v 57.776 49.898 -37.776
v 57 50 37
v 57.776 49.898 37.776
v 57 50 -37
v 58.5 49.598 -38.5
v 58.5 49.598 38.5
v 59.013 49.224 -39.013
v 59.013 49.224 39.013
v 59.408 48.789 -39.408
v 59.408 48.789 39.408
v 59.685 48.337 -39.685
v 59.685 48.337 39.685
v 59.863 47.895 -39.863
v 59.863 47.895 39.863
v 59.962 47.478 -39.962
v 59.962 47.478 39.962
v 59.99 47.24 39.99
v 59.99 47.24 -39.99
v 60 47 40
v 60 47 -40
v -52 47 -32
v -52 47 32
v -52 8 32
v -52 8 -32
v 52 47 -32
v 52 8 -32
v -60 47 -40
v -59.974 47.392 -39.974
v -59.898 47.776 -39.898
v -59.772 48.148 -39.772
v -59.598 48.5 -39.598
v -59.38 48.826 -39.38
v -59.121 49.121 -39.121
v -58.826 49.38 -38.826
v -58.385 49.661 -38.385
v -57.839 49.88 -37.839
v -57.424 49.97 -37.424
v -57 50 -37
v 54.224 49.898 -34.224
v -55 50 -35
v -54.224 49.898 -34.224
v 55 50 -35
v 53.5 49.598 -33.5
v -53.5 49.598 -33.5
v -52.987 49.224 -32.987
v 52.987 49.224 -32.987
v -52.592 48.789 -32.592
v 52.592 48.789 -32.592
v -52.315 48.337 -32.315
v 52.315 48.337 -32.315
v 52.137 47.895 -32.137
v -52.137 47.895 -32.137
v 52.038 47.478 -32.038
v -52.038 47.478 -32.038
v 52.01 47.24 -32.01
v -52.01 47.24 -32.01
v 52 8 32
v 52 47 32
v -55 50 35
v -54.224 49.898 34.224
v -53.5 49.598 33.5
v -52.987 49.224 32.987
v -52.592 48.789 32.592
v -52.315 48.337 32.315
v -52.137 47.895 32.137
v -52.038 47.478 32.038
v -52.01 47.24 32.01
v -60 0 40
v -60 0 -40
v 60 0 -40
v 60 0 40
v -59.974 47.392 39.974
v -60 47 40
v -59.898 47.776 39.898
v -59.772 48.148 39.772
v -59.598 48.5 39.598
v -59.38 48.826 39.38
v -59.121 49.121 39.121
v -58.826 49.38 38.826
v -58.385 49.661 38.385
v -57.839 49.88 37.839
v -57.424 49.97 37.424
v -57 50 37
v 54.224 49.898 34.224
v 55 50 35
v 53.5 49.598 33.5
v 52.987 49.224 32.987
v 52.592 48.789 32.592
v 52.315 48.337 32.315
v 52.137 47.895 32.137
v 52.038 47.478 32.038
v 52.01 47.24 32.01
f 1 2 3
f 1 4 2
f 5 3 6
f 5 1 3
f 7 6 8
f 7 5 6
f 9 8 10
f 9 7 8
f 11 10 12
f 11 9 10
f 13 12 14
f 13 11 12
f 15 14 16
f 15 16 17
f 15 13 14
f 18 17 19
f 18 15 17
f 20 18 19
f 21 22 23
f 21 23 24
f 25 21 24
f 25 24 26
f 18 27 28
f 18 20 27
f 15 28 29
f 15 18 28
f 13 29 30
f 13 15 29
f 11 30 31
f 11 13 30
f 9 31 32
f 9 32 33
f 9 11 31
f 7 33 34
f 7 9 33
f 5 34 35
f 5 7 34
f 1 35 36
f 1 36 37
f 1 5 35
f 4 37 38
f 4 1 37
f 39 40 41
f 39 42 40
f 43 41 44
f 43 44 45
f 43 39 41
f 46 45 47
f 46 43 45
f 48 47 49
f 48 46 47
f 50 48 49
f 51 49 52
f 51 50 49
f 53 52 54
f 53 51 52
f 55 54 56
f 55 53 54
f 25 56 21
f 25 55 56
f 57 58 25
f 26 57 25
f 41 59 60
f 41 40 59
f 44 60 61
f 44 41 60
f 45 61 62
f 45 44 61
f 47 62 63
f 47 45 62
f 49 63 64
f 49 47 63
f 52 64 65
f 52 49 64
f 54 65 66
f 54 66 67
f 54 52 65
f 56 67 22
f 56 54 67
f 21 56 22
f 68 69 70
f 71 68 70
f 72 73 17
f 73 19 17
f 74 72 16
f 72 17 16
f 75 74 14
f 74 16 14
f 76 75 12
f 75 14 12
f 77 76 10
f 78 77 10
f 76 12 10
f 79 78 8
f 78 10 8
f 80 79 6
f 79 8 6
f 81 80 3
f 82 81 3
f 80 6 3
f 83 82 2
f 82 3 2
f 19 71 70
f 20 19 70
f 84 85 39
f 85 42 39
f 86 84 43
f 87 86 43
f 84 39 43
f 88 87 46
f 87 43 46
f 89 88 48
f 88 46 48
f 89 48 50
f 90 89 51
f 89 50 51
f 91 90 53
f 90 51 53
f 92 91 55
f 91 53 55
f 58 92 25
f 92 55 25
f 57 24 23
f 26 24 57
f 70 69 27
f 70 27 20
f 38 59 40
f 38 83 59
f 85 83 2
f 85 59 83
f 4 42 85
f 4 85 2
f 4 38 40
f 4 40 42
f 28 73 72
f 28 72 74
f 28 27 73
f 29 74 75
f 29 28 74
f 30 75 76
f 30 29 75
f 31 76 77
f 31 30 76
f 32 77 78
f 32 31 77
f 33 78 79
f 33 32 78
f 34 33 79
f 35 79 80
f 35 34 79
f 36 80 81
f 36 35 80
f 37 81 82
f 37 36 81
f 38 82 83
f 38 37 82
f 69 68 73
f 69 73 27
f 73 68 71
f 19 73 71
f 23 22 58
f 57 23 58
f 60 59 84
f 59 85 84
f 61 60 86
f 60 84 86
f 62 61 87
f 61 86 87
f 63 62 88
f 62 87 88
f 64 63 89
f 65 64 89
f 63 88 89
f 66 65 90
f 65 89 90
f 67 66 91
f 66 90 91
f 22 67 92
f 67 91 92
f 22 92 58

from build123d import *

# Parameters (mm, degrees)
SKETCH_1_W          = 120
SKETCH_1_H          = 80
EXTRUDE_1_DEPTH     = 50
SKETCH_2_W          = 104
SKETCH_2_H          = 64
CUT_EXTRUDE_1_DEPTH = 42
FILLET_1_R          = 3


with BuildPart() as part:
    # 草图1 → 凸台-拉伸1 (new body)
    with BuildSketch(Plane(origin=(0, 0, 0), x_dir=(1, 0, 0), z_dir=(0, 1, 0))):
        Rectangle(SKETCH_1_W, SKETCH_1_H)
    extrude(amount=EXTRUDE_1_DEPTH)

    # 草图2 → 切除-拉伸1 (cut)
    with BuildSketch(Plane(origin=(0, 50, 0), x_dir=(1, 0, 0), z_dir=(0, 1, 0))):
        Rectangle(SKETCH_2_W, SKETCH_2_H)
    extrude(amount=-CUT_EXTRUDE_1_DEPTH, mode=Mode.SUBTRACT)

    # 圆角1
    fillet_1_edges = [part.edges().sort_by_distance(p)[0] for p in [
        (60, 50, 0),
        (0, 50, -40),
        (-52, 50, 0),
        (0, 50, 32),
        (52, 50, 0),
        (0, 50, -32),
        (-60, 50, 0),
        (0, 50, 40),
    ]]
    fillet(fillet_1_edges, radius=FILLET_1_R)


solid = part.part
